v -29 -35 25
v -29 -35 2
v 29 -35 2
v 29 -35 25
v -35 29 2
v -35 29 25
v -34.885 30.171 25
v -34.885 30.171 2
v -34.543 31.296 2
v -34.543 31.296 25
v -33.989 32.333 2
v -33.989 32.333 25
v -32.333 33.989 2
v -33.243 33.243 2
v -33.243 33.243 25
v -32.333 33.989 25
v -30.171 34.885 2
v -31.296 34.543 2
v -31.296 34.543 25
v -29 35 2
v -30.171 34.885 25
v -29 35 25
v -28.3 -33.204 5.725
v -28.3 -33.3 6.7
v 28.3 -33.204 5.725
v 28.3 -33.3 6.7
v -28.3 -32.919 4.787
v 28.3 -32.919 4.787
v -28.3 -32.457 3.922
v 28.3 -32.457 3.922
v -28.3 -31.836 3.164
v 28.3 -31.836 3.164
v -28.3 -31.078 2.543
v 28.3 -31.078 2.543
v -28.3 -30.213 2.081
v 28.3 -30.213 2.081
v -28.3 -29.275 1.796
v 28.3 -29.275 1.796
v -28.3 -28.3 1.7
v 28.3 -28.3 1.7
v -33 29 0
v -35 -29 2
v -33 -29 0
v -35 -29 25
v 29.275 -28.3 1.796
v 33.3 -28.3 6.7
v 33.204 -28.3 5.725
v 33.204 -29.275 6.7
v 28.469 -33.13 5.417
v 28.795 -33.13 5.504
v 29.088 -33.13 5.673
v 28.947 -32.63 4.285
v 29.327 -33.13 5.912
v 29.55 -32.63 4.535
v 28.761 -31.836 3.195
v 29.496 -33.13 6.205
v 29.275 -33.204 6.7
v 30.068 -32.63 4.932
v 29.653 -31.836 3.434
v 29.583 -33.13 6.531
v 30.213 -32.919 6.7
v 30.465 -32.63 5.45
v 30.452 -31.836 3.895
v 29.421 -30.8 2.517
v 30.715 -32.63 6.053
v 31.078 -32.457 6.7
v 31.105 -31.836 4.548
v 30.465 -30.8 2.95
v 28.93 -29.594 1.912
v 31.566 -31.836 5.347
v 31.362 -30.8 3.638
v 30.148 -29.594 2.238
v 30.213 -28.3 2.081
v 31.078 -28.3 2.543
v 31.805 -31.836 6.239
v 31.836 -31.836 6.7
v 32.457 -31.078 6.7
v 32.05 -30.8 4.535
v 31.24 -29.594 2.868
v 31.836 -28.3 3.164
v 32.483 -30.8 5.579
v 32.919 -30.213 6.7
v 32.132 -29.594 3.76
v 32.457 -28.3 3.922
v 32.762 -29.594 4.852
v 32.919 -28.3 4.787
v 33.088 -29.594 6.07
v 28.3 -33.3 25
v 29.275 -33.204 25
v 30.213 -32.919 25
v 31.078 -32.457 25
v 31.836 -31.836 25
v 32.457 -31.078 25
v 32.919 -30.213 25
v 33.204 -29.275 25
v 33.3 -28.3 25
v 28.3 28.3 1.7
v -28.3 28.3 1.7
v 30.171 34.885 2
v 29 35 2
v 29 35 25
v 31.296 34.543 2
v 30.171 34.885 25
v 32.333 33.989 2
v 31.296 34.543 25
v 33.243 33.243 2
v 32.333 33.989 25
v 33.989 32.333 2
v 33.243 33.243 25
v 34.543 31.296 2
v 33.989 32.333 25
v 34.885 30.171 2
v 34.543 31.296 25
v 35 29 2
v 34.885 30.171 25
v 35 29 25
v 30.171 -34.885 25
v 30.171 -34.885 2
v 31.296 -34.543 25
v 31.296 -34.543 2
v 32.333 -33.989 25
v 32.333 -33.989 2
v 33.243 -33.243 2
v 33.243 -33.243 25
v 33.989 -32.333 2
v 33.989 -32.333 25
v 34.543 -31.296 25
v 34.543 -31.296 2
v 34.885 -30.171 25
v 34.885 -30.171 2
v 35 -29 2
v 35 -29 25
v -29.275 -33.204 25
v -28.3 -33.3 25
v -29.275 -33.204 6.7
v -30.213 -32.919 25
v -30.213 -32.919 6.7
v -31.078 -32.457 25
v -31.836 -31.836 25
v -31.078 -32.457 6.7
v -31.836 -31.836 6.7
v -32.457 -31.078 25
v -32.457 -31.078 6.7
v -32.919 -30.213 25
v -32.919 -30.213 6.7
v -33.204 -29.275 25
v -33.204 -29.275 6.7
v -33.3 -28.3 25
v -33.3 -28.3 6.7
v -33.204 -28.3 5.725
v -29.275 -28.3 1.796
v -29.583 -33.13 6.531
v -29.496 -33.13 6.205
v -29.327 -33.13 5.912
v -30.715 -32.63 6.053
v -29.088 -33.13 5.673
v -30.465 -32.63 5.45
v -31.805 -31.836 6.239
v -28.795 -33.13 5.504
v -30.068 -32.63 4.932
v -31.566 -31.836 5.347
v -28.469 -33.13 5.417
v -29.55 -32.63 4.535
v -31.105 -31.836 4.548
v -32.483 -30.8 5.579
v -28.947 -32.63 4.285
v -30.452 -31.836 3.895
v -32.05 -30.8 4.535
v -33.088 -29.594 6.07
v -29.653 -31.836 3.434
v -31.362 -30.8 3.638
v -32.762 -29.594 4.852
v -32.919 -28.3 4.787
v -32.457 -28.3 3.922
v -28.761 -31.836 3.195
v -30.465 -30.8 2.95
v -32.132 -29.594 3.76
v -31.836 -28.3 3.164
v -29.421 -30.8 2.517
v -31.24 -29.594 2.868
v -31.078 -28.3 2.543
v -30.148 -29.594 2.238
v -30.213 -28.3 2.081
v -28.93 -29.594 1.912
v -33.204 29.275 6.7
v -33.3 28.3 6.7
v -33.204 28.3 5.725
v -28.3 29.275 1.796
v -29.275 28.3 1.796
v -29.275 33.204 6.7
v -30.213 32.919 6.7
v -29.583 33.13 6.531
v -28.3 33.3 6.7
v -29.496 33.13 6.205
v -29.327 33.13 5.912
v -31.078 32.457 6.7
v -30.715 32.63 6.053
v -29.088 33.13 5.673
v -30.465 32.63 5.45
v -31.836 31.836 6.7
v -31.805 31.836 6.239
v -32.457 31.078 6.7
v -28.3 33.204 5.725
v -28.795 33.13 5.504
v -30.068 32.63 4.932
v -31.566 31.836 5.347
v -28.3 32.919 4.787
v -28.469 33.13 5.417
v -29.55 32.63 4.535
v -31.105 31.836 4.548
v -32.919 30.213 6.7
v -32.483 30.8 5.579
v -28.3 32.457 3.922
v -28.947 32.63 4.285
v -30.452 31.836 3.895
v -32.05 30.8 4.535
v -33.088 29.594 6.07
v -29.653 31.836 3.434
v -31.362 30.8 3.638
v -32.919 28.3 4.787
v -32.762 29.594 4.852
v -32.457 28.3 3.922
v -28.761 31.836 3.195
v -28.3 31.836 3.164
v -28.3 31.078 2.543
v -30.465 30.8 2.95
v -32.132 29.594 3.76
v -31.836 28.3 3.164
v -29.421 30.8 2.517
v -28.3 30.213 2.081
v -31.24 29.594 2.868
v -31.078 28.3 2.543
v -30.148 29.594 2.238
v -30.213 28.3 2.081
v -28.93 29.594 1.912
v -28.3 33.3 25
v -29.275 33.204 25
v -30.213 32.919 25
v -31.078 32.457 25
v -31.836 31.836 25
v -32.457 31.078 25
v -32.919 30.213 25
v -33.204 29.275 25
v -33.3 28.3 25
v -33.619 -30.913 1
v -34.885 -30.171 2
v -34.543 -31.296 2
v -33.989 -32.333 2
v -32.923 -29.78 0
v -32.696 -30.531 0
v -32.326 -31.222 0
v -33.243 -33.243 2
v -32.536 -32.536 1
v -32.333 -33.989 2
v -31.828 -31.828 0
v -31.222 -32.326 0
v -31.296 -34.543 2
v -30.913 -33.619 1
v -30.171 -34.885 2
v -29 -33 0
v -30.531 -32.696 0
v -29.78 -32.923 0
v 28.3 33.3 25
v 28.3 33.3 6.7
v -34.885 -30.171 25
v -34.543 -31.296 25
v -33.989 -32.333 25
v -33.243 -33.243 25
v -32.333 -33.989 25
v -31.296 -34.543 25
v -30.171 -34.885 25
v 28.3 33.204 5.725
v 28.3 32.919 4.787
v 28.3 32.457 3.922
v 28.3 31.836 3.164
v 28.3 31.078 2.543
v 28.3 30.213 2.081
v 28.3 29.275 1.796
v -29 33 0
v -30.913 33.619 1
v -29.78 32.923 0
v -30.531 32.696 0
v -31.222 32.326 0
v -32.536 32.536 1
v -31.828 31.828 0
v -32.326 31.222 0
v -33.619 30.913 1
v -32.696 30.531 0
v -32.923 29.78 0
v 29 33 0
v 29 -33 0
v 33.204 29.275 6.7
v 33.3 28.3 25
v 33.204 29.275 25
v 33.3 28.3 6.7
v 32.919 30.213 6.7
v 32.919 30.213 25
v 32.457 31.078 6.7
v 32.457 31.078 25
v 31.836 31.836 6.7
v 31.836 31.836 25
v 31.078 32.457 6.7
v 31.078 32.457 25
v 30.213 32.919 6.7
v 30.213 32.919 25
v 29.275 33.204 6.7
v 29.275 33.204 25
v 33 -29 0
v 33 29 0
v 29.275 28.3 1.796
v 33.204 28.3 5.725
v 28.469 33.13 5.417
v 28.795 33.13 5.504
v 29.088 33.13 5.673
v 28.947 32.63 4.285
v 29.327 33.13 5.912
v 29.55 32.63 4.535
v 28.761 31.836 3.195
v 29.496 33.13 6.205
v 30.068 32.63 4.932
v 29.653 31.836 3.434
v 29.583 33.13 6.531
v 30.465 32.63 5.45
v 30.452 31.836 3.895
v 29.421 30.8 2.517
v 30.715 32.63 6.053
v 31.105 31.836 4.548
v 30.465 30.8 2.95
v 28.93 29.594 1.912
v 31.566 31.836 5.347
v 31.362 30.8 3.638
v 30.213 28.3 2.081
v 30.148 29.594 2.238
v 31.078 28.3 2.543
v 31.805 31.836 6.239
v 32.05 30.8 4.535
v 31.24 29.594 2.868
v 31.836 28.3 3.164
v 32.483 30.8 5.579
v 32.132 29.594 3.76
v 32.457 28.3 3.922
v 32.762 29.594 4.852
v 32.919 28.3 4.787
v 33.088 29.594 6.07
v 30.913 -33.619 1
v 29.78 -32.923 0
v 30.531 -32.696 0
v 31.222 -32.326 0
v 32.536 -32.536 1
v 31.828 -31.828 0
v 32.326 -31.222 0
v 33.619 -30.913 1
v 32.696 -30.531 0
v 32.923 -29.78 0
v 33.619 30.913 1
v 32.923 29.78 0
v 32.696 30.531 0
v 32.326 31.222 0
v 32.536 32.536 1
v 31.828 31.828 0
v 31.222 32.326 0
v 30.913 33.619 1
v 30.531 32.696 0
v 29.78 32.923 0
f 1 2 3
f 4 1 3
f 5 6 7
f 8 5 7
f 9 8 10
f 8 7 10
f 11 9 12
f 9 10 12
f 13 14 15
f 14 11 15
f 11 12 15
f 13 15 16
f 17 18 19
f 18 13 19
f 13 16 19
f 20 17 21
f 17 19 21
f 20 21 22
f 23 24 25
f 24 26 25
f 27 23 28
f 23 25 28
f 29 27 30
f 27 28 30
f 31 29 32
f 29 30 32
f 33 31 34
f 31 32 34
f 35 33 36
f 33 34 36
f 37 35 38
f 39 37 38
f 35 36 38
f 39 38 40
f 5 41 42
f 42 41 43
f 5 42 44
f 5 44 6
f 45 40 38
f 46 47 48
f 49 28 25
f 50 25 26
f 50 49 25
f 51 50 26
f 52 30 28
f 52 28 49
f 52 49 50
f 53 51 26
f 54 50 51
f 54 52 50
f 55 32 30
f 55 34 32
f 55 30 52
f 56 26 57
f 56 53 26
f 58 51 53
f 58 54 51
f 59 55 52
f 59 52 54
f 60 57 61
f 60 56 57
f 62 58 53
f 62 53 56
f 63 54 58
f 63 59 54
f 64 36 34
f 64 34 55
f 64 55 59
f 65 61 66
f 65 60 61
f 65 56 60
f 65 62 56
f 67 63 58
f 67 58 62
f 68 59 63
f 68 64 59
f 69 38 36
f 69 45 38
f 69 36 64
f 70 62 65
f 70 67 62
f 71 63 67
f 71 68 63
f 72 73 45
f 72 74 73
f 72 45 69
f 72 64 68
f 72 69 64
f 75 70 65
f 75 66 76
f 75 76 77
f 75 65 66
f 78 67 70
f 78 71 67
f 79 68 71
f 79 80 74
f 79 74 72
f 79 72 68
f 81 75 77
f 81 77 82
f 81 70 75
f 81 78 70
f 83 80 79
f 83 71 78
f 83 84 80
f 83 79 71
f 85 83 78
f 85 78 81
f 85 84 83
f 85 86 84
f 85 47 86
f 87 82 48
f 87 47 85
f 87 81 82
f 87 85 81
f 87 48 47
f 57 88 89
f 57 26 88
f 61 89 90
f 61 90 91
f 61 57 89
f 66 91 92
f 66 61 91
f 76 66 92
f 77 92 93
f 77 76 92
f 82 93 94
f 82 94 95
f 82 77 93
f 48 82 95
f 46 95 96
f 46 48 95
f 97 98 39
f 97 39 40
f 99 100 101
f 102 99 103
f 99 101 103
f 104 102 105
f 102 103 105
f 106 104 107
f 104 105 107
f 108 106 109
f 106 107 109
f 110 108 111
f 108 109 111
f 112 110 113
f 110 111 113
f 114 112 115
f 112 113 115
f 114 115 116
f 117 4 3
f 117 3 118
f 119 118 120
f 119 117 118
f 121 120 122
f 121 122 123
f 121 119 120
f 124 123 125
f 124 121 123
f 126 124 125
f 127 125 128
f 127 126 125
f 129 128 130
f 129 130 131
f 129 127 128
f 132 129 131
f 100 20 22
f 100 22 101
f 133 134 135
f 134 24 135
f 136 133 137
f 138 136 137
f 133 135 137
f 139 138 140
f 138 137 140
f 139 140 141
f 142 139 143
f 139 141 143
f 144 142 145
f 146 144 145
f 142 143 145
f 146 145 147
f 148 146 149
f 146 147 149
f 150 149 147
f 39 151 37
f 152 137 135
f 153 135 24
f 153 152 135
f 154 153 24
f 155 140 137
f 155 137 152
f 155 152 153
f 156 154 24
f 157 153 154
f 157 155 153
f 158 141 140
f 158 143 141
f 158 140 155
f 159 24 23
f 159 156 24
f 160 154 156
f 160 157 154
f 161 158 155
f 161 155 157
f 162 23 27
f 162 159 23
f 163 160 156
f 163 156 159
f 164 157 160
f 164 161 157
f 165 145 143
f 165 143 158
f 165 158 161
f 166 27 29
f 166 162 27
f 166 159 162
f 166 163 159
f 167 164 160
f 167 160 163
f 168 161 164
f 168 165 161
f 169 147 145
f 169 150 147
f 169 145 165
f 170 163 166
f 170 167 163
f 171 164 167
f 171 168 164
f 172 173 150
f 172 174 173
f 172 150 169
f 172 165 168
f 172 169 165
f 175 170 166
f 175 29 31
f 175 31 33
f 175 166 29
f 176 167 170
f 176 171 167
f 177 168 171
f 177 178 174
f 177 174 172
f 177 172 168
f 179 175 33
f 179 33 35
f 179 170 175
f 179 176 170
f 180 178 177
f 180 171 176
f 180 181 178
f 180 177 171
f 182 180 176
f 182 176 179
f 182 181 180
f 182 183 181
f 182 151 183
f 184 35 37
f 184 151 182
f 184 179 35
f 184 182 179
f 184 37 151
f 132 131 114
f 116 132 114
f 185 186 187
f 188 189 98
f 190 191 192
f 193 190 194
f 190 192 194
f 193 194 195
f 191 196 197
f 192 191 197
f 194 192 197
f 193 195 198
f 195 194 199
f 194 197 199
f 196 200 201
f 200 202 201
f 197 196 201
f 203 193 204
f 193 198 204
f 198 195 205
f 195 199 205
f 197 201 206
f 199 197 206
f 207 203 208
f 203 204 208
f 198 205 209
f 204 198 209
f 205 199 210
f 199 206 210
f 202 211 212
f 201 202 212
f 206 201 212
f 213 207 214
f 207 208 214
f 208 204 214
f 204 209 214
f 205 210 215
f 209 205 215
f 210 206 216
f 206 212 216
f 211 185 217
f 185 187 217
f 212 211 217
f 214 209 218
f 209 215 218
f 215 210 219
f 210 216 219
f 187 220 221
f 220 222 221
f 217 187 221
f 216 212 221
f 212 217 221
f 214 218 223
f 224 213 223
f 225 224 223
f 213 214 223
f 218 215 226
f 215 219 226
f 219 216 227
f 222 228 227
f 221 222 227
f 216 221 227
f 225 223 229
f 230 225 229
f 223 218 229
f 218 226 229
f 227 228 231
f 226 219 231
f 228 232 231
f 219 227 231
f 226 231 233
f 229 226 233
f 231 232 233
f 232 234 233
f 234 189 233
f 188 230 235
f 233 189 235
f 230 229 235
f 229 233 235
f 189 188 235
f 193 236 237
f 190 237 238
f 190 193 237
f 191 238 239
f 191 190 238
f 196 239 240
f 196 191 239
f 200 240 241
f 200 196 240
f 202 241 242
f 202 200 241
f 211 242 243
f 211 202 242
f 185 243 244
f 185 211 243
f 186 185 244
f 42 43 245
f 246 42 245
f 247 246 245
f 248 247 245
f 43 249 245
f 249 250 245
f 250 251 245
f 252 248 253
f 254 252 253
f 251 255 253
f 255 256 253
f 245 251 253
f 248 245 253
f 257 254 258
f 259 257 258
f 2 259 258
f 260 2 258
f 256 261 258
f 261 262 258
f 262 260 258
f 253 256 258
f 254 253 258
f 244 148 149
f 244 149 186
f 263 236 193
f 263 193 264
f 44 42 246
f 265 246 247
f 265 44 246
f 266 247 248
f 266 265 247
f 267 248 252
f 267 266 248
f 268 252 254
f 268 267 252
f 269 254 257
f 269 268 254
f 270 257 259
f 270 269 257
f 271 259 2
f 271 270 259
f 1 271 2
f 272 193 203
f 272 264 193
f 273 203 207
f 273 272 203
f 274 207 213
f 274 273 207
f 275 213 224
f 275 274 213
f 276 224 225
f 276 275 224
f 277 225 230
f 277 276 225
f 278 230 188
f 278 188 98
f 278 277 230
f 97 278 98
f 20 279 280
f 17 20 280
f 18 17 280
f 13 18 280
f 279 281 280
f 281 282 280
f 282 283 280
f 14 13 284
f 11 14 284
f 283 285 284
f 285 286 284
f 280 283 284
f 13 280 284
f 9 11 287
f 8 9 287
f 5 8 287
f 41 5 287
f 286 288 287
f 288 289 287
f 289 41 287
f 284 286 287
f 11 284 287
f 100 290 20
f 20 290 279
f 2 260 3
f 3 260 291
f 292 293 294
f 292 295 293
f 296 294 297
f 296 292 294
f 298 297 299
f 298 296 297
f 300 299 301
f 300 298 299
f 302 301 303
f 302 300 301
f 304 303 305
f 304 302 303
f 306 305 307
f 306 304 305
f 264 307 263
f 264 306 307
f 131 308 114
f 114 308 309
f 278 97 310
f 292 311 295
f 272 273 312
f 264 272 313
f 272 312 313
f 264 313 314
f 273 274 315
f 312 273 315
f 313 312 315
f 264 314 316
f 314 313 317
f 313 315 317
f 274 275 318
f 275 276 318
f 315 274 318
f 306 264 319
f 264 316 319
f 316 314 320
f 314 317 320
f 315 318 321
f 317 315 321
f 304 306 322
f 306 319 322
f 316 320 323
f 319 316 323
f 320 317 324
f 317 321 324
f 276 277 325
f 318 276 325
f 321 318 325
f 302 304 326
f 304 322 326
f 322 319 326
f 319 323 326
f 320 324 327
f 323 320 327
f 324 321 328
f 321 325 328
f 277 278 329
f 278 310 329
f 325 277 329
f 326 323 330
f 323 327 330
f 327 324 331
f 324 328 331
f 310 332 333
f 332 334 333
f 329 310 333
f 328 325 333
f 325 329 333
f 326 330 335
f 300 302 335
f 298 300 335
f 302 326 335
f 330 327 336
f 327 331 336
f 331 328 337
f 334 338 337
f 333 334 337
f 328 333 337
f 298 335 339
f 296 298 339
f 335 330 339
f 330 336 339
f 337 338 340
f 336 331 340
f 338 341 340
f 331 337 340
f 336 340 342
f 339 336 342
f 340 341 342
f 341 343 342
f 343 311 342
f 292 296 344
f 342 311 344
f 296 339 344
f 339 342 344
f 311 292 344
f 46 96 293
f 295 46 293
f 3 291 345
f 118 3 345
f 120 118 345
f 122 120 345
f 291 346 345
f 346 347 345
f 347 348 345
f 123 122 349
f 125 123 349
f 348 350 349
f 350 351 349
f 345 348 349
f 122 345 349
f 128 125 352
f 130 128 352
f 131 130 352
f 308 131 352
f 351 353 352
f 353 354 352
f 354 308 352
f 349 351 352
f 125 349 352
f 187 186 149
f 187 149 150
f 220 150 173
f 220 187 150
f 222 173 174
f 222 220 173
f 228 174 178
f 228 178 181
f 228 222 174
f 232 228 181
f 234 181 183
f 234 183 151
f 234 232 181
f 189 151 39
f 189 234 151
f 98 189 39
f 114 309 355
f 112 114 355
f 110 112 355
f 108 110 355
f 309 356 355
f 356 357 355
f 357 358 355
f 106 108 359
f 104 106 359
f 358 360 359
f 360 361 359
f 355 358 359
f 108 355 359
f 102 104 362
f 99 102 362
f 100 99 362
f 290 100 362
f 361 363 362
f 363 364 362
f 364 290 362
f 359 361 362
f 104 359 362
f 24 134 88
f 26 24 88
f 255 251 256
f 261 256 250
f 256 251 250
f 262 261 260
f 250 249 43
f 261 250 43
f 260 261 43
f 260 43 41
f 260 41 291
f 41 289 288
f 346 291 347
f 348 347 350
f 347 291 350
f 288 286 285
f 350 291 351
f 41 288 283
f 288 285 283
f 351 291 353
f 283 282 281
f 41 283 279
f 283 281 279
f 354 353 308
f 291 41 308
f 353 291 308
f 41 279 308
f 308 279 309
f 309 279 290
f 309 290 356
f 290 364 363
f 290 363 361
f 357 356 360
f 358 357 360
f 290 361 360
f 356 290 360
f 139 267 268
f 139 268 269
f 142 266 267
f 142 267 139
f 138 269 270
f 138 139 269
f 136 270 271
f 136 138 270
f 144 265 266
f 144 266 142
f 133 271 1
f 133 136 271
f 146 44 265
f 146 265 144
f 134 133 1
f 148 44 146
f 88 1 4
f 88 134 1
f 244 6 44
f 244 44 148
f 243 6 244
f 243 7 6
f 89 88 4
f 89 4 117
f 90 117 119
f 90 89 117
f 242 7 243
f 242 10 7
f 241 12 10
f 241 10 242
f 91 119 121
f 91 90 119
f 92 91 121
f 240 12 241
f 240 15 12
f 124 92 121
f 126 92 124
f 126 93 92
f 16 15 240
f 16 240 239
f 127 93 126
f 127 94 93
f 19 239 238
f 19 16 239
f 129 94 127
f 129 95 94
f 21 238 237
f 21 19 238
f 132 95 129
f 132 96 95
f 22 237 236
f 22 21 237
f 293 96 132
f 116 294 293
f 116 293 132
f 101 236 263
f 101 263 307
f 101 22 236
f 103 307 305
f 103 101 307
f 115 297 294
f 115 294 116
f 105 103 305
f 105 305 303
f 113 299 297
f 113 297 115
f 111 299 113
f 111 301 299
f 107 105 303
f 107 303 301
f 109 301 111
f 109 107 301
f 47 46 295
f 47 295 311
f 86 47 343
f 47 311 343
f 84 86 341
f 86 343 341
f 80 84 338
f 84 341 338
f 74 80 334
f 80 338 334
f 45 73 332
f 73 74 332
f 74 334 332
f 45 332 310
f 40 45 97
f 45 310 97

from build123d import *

# Parameters (mm, degrees)
F0_W     = 70
F0_H     = 70
F0_W_2   = 66.6
F0_H_2   = 66.6
F1_DEPTH = 25
F2_W     = 66.6
F2_H     = 66.6
F3_DEPTH = 23.3
F4_R     = 5
F5_R     = 6
F6_SIZE  = 2


with BuildPart() as f1:
    # F0 (on Top) → F1 (new body)
    with BuildSketch(Plane.XY):
        Rectangle(F0_W, F0_H)
        Rectangle(F0_W_2, F0_H_2, mode=Mode.SUBTRACT)
        Rectangle(F0_W_2, F0_H_2)
    extrude(amount=F1_DEPTH)

    # F2 (on face) → F3 (cut)
    with BuildSketch(Plane.XY.offset(25)):
        Rectangle(F2_W, F2_H)
    extrude(amount=-F3_DEPTH, mode=Mode.SUBTRACT)

    # F4
    f4_edges = [f1.edges().sort_by_distance(p)[0] for p in [
        (-33.3, 0, 1.7),
        (33.3, 0, 1.7),
        (-33.3, 33.3, 13.35),
        (0, 33.3, 1.7),
        (-33.3, -33.3, 13.35),
        (0, -33.3, 1.7),
        (33.3, -33.3, 13.35),
        (33.3, 33.3, 13.35),
    ]]
    fillet(f4_edges, radius=F4_R)

    # F5
    f5_edges = [f1.edges().sort_by_distance(p)[0] for p in [
        (35, 35, 12.5),
        (-35, 35, 12.5),
        (35, -35, 12.5),
        (-35, -35, 12.5),
    ]]
    fillet(f5_edges, radius=F5_R)

    # F6
    f6_edges = [f1.edges().sort_by_distance(p)[0] for p in [
        (35, 0, 0),
    ]]
    chamfer(f6_edges, length=F6_SIZE)


solid = f1.part
